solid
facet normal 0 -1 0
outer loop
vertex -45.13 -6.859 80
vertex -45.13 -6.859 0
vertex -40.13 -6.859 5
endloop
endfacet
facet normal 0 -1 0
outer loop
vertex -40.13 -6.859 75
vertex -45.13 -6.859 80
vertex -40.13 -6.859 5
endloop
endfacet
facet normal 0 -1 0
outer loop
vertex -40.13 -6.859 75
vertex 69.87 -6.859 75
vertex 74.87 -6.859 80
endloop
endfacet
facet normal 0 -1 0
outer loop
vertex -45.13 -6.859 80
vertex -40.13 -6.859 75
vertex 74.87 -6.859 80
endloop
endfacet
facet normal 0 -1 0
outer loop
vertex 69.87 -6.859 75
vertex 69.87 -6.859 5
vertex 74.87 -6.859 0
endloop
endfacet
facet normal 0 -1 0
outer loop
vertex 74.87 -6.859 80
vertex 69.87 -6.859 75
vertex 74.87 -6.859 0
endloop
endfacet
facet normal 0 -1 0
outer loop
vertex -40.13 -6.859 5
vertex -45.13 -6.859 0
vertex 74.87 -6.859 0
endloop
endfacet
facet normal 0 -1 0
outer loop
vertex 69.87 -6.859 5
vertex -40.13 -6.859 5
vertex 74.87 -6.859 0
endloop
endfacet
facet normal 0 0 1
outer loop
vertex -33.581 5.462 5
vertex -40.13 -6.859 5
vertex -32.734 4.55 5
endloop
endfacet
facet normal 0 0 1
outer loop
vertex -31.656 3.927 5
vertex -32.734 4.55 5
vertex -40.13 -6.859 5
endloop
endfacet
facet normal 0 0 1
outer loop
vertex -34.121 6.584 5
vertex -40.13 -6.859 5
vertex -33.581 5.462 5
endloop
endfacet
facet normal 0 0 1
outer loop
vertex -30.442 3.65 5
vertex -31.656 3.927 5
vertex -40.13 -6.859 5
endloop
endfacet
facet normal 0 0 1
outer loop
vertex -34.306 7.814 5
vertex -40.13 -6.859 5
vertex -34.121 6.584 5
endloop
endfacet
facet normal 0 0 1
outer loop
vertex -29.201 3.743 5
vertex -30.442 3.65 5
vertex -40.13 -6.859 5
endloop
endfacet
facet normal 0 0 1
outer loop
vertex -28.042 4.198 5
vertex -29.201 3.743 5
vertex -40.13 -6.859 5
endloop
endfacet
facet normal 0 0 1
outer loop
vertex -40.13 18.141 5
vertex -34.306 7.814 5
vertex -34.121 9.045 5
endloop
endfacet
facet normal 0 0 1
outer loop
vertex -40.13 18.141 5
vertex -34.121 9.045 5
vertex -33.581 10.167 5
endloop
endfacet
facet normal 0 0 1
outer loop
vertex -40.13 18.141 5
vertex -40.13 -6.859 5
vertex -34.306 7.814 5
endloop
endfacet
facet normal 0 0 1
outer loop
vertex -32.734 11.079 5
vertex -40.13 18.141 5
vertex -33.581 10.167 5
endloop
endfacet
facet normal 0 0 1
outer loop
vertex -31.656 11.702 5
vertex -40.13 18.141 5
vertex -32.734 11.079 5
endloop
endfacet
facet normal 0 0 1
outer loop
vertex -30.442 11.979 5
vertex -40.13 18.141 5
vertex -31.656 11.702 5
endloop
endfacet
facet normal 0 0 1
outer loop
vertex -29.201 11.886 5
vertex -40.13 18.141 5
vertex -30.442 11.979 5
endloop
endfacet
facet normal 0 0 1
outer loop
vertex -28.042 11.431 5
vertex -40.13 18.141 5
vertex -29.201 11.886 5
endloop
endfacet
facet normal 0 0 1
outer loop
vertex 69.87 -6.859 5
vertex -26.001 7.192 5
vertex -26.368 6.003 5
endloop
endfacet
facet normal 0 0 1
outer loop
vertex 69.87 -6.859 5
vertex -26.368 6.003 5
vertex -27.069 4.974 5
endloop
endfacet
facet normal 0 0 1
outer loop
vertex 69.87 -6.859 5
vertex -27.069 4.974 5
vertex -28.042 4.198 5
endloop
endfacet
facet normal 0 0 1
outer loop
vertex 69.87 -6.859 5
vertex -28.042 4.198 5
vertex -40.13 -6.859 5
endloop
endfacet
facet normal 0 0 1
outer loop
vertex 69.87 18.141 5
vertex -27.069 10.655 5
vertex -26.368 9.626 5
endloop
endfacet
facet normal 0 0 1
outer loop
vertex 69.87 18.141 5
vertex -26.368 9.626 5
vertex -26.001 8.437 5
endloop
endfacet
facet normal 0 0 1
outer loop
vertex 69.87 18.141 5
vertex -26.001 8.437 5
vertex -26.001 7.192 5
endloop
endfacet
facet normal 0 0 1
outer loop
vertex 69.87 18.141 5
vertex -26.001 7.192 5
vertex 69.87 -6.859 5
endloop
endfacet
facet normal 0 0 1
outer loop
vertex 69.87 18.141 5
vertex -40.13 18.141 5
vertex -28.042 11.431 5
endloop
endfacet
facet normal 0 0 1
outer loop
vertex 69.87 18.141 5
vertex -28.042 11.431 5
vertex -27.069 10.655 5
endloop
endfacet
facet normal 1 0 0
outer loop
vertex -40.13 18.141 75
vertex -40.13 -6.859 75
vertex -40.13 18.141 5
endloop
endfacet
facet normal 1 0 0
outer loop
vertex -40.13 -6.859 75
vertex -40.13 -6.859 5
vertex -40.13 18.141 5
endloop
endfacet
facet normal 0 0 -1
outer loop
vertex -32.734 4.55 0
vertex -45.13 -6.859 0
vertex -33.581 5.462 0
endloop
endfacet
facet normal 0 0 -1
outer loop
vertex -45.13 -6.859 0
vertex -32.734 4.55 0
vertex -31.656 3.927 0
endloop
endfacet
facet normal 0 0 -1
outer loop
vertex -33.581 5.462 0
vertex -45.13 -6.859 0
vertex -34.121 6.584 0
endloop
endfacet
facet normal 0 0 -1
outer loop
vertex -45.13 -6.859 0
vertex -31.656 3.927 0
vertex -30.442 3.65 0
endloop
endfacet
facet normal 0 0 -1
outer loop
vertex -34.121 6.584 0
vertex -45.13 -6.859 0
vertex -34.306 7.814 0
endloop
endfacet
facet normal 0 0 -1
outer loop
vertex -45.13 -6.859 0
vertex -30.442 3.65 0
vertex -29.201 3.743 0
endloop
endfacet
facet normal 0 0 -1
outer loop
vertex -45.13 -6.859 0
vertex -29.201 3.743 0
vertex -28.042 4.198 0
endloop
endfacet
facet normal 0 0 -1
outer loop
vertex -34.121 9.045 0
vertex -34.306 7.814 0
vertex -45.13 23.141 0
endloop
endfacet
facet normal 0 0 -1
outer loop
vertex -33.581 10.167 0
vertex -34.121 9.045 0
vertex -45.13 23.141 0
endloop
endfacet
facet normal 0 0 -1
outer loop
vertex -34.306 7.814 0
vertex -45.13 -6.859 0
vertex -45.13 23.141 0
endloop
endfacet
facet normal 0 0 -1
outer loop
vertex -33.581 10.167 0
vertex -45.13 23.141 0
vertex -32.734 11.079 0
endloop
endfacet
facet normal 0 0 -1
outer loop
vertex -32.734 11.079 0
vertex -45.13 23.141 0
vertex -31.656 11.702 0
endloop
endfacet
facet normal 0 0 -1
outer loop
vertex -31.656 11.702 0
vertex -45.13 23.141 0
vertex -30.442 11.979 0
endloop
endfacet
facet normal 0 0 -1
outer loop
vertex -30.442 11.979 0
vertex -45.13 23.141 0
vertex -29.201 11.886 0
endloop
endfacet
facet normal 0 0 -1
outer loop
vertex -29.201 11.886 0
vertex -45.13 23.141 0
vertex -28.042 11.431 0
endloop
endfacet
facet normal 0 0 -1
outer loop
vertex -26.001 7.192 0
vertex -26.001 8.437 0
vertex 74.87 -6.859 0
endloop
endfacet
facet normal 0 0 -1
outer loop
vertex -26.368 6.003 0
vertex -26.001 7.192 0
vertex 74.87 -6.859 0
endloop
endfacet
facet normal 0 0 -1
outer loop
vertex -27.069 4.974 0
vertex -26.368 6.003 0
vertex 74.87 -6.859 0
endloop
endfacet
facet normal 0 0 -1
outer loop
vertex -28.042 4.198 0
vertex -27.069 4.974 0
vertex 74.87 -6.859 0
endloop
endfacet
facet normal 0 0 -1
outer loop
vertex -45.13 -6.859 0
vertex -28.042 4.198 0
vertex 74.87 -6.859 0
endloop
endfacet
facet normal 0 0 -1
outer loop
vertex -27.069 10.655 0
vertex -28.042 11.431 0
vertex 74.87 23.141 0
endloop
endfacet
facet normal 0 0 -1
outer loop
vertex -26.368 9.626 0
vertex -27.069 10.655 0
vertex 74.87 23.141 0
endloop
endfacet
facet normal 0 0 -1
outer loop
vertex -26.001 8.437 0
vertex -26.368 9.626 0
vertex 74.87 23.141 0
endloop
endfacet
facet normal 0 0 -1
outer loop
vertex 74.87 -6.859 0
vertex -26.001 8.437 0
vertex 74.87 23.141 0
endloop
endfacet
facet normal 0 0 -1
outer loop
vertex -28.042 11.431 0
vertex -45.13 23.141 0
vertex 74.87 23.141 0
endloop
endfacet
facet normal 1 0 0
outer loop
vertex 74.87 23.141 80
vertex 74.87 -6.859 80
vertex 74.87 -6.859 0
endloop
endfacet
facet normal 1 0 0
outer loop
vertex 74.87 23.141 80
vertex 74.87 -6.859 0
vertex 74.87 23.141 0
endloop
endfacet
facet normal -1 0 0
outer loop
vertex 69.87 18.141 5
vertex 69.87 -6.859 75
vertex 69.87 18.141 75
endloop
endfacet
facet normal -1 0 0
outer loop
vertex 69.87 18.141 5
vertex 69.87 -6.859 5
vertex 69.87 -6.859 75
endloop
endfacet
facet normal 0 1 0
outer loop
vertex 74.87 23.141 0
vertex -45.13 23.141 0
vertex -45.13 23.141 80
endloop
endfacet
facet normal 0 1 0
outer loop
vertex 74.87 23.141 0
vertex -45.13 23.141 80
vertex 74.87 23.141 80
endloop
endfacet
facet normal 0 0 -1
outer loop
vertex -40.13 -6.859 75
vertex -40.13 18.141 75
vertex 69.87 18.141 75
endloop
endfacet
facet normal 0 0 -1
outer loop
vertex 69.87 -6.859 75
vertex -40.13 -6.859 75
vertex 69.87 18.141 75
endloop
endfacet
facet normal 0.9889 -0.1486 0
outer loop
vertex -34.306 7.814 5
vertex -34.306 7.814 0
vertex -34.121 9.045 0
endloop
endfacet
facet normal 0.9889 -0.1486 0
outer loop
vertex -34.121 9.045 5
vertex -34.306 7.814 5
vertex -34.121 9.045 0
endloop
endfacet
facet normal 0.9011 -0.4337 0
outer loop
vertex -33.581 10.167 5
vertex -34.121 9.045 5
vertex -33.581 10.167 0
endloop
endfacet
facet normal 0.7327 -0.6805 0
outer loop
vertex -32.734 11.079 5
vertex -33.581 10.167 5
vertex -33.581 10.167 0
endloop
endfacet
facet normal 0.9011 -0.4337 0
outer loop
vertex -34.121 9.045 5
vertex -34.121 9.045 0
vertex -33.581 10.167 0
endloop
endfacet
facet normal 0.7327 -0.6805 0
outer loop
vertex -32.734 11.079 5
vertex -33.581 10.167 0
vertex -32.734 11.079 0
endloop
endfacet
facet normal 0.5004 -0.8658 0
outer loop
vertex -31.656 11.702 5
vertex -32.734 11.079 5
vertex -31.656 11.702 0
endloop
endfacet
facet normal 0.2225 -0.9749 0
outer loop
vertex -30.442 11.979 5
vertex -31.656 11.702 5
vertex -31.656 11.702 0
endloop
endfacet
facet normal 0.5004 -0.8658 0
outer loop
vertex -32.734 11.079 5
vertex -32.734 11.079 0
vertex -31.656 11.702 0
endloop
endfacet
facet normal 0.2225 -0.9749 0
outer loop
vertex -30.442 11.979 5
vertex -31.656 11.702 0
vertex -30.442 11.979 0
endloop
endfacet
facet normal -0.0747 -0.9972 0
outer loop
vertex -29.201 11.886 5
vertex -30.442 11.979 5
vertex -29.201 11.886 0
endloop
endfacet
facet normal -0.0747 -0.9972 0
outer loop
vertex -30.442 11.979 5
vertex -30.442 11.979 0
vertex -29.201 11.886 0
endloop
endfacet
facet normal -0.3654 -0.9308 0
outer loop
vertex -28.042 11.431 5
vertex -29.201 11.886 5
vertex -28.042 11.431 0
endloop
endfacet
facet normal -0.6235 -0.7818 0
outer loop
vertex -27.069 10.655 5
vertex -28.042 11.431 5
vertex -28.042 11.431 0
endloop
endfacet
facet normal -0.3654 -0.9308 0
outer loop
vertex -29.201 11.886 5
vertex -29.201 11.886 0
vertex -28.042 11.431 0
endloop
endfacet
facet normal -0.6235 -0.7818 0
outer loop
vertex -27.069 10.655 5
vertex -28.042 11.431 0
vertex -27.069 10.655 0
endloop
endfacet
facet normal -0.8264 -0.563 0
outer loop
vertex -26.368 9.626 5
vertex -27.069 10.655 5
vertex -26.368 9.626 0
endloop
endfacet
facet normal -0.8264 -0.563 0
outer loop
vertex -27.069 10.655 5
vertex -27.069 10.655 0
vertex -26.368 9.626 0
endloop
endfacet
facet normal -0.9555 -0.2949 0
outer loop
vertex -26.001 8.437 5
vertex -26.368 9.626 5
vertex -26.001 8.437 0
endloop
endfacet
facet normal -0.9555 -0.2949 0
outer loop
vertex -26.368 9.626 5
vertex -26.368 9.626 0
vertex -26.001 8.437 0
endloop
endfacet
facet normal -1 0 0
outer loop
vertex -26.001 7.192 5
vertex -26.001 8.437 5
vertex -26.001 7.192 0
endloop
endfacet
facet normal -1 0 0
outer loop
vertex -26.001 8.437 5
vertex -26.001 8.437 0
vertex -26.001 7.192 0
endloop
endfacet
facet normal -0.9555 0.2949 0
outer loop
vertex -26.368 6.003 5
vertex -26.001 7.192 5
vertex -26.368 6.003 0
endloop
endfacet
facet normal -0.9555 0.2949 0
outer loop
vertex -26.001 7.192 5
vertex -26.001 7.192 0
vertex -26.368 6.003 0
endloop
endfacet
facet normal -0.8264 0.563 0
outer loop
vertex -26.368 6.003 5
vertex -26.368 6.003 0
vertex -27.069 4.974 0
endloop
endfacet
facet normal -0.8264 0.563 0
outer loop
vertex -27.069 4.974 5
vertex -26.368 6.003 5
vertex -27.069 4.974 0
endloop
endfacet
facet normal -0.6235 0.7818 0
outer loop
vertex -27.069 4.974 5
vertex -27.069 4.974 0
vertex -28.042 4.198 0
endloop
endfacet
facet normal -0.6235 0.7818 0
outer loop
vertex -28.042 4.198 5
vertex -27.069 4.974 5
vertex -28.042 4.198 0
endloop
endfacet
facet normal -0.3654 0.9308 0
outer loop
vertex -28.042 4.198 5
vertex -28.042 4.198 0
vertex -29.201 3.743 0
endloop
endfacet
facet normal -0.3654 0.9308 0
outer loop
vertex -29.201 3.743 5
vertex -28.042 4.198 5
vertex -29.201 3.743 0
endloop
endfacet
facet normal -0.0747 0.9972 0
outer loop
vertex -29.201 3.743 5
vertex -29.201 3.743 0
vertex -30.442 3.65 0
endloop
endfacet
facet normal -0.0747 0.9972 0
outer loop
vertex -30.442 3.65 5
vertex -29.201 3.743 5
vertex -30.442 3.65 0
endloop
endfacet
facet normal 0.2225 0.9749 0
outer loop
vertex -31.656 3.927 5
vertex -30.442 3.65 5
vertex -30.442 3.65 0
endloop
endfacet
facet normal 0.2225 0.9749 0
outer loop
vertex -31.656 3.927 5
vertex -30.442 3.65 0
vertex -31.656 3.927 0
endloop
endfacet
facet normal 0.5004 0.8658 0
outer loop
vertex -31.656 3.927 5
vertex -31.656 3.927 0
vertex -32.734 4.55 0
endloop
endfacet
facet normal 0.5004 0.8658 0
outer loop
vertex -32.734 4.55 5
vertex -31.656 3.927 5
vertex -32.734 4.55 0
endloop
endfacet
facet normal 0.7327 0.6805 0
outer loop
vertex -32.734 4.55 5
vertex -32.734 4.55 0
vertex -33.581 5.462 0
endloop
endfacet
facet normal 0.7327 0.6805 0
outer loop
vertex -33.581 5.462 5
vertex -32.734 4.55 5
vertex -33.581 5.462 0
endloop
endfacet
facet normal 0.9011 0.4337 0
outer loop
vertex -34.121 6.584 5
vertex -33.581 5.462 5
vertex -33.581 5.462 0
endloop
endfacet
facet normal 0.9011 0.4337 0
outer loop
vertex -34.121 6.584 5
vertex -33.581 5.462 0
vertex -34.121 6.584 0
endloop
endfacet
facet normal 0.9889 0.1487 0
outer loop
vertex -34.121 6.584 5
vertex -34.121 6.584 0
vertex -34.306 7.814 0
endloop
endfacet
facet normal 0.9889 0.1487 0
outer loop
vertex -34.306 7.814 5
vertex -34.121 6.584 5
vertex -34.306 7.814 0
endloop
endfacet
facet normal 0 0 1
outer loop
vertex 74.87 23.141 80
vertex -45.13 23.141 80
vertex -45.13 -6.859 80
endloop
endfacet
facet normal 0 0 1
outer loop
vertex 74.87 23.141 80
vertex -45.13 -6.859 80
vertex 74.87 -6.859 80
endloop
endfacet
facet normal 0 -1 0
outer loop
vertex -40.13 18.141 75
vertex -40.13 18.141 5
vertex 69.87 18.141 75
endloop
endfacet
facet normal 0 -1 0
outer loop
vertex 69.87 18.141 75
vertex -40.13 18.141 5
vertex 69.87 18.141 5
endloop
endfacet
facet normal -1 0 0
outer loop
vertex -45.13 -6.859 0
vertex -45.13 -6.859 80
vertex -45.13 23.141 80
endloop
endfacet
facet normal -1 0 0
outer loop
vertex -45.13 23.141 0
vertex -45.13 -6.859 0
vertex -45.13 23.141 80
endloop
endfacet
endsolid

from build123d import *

# Parameters (mm, degrees)
SKETCH1_W           = 120
SKETCH1_H           = 30
BOSS_EXTRUDE1_DEPTH = 80
SHELL1_T            = -5
SKETCH2_R           = 4.17592015
CUT_EXTRUDE1_DEPTH  = 15
LPATTERN1_COUNT     = 4
LPATTERN1_PITCH     = 110


with BuildPart() as part:
    # Sketch1 → Boss-Extrude1 (new body)
    with BuildSketch(Plane.XY):
        with Locations((14.869684499, 8.141289438)):
            Rectangle(SKETCH1_W, SKETCH1_H)
    extrude(amount=BOSS_EXTRUDE1_DEPTH)

    # Shell1
    shell1_openings = [part.faces().sort_by_distance(p)[0] for p in [
        (14.869684499, -6.858710562, 40),
    ]]
    offset(amount=SHELL1_T, openings=shell1_openings, kind=Kind.INTERSECTION)

    # Sketch2 → Cut-Extrude1 (cut)
    with BuildSketch(Plane(origin=(0, 0, 0), x_dir=(-1, 0, 0), z_dir=(0, 0, -1))):
        with Locations((30.130315501, 7.814471991)):
            Circle(SKETCH2_R)
    cut_extrude1 = extrude(amount=-CUT_EXTRUDE1_DEPTH, mode=Mode.SUBTRACT)

    # LPattern1: Cut-Extrude1 ×4
    with Locations(*[(-i * LPATTERN1_PITCH, 0, 0) for i in range(1, LPATTERN1_COUNT)]):
        add(cut_extrude1, mode=Mode.SUBTRACT)


solid = part.part
